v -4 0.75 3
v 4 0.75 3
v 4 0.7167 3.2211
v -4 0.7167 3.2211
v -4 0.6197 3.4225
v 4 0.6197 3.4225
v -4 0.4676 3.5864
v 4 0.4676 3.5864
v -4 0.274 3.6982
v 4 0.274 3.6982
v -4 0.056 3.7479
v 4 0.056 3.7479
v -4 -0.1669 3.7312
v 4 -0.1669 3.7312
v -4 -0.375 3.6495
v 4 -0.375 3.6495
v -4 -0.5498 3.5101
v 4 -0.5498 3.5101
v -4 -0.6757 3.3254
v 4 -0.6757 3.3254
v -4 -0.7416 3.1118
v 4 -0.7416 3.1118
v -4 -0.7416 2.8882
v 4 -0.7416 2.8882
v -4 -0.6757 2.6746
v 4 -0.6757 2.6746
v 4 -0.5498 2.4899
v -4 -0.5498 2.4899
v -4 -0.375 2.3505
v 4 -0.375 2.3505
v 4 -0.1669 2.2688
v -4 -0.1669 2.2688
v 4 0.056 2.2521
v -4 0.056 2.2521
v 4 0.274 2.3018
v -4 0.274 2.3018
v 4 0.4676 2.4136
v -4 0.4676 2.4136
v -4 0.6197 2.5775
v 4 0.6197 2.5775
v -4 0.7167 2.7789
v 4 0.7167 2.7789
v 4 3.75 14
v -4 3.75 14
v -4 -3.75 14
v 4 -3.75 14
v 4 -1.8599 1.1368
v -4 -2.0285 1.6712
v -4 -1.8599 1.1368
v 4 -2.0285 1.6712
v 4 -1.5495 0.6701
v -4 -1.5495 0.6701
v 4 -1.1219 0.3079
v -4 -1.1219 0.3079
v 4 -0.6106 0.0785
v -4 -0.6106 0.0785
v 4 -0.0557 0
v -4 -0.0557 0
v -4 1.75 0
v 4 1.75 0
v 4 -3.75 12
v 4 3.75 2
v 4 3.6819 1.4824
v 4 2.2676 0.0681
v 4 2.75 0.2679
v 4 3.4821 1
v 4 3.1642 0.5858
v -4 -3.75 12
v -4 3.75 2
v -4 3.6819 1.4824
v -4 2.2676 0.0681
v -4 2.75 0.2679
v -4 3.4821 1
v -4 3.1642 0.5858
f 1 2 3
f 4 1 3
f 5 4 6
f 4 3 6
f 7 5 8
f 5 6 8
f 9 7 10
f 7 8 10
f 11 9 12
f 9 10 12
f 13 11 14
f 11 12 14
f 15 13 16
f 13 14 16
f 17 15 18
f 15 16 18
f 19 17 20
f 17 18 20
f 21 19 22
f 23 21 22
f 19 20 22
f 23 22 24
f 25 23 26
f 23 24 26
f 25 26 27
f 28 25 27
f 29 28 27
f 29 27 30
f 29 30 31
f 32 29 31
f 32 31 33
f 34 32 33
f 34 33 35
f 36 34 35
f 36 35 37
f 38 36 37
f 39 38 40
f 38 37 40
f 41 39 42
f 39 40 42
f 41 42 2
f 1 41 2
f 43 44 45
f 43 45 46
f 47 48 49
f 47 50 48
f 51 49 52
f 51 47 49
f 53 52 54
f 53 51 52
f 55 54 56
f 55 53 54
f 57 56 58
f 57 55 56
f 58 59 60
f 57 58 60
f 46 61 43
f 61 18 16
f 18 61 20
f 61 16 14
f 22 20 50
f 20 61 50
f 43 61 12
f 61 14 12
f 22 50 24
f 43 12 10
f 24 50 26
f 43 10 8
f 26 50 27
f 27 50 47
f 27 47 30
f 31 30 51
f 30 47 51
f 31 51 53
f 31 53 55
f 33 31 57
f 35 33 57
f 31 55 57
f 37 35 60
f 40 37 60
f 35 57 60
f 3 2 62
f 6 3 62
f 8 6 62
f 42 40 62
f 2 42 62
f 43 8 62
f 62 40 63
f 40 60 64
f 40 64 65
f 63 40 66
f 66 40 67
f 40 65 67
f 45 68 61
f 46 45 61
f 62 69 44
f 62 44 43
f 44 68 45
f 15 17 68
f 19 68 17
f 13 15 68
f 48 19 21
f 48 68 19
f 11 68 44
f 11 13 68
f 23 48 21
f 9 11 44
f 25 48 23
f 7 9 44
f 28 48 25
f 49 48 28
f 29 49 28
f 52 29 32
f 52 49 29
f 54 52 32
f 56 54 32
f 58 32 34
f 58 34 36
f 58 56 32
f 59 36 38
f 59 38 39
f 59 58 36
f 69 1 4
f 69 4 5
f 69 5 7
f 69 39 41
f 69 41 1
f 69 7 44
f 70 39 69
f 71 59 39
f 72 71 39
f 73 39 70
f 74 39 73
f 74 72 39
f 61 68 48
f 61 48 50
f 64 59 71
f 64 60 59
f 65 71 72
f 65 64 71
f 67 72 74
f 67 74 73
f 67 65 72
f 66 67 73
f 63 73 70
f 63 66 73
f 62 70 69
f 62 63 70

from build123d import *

# Parameters (mm, degrees)
F0_W     = 8
F0_H     = 7.5
F1_DEPTH = 14
F3_R     = 0.75
F4_DEPTH = 8
F5_SIZE2 = 12
F5_SIZE  = 2
F6_R     = 2
F7_R     = 2


with BuildPart() as f1:
    # F0 (on Top) → F1 (new body)
    with BuildSketch(Plane.XY):
        Rectangle(F0_W, F0_H)
    extrude(amount=F1_DEPTH)

    # F3 (on face) → F4 (cut)
    with BuildSketch(Plane.YZ.offset(4)):
        with Locations((0, 3)):
            Circle(F3_R)
    extrude(amount=-F4_DEPTH, mode=Mode.SUBTRACT)

    # F5
    f5_edges = [f1.edges().sort_by_distance(p)[0] for p in [
        (0, -3.75, 0),
    ]]
    f5_side = f1.faces().sort_by_distance((0, 0, 0))[0]
    chamfer(f5_edges, length=F5_SIZE, length2=F5_SIZE2, reference=f5_side)

    # F6
    f6_edges = [f1.edges().sort_by_distance(p)[0] for p in [
        (0, -1.75, 0),
    ]]
    fillet(f6_edges, radius=F6_R)

    # F7
    f7_edges = [f1.edges().sort_by_distance(p)[0] for p in [
        (0, 3.75, 0),
    ]]
    fillet(f7_edges, radius=F7_R)


solid = f1.part
